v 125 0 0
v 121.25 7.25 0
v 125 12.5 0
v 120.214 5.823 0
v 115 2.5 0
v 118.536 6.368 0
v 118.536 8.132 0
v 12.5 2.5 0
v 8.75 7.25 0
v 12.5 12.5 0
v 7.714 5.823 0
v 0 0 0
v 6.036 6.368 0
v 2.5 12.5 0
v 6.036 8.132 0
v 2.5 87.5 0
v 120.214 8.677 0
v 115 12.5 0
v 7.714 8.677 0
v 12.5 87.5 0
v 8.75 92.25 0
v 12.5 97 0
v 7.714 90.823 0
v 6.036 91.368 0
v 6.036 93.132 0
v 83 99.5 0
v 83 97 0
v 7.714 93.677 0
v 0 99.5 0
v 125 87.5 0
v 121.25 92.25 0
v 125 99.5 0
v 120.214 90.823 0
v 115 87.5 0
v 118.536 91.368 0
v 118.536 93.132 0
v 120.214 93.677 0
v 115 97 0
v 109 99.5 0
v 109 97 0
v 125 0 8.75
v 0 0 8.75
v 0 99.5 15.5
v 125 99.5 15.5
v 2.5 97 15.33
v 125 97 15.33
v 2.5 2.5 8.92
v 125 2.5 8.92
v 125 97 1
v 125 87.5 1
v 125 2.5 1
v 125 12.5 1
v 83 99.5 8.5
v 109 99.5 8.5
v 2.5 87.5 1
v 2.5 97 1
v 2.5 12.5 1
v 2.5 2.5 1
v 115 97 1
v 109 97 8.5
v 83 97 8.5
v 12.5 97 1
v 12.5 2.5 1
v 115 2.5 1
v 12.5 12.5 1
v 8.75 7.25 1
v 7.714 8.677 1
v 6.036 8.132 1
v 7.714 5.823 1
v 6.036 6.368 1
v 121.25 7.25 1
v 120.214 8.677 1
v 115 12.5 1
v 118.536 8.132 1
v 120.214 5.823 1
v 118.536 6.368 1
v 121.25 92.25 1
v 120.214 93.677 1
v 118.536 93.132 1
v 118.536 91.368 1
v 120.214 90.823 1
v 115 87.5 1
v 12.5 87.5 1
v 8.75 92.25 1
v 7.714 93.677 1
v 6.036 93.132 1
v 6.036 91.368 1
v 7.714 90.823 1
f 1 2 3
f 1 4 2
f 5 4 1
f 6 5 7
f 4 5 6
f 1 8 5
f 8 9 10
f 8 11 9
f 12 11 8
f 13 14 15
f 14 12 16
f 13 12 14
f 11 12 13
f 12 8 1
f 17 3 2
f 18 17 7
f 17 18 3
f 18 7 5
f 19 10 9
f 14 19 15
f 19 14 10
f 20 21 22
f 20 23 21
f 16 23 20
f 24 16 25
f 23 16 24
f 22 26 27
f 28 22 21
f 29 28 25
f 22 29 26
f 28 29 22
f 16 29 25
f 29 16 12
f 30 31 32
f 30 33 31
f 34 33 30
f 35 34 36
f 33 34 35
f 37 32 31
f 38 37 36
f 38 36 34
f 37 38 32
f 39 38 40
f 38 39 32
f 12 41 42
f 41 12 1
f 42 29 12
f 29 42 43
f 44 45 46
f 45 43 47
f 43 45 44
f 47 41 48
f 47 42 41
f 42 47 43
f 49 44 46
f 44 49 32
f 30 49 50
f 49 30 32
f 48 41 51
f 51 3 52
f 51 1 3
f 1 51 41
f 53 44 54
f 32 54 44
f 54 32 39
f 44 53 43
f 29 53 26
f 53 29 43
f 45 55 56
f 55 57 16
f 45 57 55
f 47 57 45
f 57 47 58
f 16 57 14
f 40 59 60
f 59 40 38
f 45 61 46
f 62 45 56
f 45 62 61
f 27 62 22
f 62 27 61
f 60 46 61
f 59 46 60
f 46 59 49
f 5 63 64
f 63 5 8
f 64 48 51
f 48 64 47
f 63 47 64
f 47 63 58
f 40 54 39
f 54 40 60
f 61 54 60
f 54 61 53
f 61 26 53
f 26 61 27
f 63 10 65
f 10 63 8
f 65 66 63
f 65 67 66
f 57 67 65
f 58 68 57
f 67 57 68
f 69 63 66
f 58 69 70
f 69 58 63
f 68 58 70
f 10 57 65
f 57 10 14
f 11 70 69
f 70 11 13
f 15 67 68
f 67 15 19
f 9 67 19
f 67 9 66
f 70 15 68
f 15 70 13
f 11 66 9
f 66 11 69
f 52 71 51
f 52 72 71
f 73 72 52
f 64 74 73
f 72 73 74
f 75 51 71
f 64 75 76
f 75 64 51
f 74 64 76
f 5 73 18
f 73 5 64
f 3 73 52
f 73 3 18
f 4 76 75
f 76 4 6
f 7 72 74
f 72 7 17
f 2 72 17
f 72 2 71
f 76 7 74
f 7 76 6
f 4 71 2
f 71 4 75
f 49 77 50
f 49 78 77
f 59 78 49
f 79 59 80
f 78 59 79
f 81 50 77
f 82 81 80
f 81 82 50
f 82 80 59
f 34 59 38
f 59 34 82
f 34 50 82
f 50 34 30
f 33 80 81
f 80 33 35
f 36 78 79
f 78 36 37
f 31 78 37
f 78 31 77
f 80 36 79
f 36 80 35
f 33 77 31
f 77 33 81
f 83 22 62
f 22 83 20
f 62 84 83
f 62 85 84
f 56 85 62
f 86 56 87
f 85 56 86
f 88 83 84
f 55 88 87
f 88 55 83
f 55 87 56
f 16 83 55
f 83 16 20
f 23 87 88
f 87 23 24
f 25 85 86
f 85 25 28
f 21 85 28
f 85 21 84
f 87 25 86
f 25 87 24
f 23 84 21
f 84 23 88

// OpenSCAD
// Create the leftmost component of a mechanical keyboard case

// Define the outermost points of the casing
wallPoints = [
    [0,0,0],
    [125,0,0],
    [125,99.5,0],
    [0,99.5,0],
    [0,0,8.75],
    [125,0,8.75],
    [125,99.5,15.5],
    [0,99.5,15.5]
];

// Define a 2D array containing the point ordering to create the facade of the case
wallFaces = [
  [0,1,2,3],  // bottom
  [4,5,1,0],  // front
  [7,6,5,4],  // top
  [5,6,2,1],  // right
  [6,7,3,2],  // back
  [7,4,0,3]   // left
];

/* Create the left hand side of the casing
 *
 * First, take the difference of the polyhedron the makes up the case with a cube smaller 
 * than the polyhedron with an offset of 2.5mm on the X & Y axes  
 *
 * Second, take the difference of the result and a second cube for the USB port hole
 */
difference(){
    difference() {
        polyhedron(wallPoints, wallFaces);
        translate([2.5,2.5,0]) {
            cube([122.5,94.5,16]);
        }
    }
    translate([83,97,0]) {
        cube([26,2.5,8.5]);
    }
}

// Define constants used for supports that will attach the case to the frame
raftSideLength = 10;
raftHeight = 1;
raftScrewHoleRadius = 1.5;
screwHoleOffset = 4.75;

// Create four rafts (one in each corner) that will be used to secure this part to the steel plate
translate([2.5,2.5,0]) {
    difference() {
        cube([raftSideLength,raftSideLength,raftHeight]);
        translate([screwHoleOffset,screwHoleOffset,0]) {
            cylinder(h=raftHeight, r=raftScrewHoleRadius);
        }
    }
}

translate([115,2.5,0]) {
    difference() {
        cube([raftSideLength,raftSideLength,raftHeight]);
        translate([screwHoleOffset,screwHoleOffset,0]) {
            cylinder(h=raftHeight, r=raftScrewHoleRadius);
        }
    }
}
translate([115,87.5,0]) {
    difference() {
        cube([raftSideLength,raftSideLength,raftHeight]);
        translate([screwHoleOffset,screwHoleOffset,0]) {
            cylinder(h=raftHeight, r=raftScrewHoleRadius);
        }
    }
}

translate([2.5,87.5,0]) {
    difference() {
        cube([raftSideLength,raftSideLength,raftHeight]);
        translate([screwHoleOffset,screwHoleOffset,0]) {
            cylinder(h=raftHeight, r=raftScrewHoleRadius);
        }
    }
}
